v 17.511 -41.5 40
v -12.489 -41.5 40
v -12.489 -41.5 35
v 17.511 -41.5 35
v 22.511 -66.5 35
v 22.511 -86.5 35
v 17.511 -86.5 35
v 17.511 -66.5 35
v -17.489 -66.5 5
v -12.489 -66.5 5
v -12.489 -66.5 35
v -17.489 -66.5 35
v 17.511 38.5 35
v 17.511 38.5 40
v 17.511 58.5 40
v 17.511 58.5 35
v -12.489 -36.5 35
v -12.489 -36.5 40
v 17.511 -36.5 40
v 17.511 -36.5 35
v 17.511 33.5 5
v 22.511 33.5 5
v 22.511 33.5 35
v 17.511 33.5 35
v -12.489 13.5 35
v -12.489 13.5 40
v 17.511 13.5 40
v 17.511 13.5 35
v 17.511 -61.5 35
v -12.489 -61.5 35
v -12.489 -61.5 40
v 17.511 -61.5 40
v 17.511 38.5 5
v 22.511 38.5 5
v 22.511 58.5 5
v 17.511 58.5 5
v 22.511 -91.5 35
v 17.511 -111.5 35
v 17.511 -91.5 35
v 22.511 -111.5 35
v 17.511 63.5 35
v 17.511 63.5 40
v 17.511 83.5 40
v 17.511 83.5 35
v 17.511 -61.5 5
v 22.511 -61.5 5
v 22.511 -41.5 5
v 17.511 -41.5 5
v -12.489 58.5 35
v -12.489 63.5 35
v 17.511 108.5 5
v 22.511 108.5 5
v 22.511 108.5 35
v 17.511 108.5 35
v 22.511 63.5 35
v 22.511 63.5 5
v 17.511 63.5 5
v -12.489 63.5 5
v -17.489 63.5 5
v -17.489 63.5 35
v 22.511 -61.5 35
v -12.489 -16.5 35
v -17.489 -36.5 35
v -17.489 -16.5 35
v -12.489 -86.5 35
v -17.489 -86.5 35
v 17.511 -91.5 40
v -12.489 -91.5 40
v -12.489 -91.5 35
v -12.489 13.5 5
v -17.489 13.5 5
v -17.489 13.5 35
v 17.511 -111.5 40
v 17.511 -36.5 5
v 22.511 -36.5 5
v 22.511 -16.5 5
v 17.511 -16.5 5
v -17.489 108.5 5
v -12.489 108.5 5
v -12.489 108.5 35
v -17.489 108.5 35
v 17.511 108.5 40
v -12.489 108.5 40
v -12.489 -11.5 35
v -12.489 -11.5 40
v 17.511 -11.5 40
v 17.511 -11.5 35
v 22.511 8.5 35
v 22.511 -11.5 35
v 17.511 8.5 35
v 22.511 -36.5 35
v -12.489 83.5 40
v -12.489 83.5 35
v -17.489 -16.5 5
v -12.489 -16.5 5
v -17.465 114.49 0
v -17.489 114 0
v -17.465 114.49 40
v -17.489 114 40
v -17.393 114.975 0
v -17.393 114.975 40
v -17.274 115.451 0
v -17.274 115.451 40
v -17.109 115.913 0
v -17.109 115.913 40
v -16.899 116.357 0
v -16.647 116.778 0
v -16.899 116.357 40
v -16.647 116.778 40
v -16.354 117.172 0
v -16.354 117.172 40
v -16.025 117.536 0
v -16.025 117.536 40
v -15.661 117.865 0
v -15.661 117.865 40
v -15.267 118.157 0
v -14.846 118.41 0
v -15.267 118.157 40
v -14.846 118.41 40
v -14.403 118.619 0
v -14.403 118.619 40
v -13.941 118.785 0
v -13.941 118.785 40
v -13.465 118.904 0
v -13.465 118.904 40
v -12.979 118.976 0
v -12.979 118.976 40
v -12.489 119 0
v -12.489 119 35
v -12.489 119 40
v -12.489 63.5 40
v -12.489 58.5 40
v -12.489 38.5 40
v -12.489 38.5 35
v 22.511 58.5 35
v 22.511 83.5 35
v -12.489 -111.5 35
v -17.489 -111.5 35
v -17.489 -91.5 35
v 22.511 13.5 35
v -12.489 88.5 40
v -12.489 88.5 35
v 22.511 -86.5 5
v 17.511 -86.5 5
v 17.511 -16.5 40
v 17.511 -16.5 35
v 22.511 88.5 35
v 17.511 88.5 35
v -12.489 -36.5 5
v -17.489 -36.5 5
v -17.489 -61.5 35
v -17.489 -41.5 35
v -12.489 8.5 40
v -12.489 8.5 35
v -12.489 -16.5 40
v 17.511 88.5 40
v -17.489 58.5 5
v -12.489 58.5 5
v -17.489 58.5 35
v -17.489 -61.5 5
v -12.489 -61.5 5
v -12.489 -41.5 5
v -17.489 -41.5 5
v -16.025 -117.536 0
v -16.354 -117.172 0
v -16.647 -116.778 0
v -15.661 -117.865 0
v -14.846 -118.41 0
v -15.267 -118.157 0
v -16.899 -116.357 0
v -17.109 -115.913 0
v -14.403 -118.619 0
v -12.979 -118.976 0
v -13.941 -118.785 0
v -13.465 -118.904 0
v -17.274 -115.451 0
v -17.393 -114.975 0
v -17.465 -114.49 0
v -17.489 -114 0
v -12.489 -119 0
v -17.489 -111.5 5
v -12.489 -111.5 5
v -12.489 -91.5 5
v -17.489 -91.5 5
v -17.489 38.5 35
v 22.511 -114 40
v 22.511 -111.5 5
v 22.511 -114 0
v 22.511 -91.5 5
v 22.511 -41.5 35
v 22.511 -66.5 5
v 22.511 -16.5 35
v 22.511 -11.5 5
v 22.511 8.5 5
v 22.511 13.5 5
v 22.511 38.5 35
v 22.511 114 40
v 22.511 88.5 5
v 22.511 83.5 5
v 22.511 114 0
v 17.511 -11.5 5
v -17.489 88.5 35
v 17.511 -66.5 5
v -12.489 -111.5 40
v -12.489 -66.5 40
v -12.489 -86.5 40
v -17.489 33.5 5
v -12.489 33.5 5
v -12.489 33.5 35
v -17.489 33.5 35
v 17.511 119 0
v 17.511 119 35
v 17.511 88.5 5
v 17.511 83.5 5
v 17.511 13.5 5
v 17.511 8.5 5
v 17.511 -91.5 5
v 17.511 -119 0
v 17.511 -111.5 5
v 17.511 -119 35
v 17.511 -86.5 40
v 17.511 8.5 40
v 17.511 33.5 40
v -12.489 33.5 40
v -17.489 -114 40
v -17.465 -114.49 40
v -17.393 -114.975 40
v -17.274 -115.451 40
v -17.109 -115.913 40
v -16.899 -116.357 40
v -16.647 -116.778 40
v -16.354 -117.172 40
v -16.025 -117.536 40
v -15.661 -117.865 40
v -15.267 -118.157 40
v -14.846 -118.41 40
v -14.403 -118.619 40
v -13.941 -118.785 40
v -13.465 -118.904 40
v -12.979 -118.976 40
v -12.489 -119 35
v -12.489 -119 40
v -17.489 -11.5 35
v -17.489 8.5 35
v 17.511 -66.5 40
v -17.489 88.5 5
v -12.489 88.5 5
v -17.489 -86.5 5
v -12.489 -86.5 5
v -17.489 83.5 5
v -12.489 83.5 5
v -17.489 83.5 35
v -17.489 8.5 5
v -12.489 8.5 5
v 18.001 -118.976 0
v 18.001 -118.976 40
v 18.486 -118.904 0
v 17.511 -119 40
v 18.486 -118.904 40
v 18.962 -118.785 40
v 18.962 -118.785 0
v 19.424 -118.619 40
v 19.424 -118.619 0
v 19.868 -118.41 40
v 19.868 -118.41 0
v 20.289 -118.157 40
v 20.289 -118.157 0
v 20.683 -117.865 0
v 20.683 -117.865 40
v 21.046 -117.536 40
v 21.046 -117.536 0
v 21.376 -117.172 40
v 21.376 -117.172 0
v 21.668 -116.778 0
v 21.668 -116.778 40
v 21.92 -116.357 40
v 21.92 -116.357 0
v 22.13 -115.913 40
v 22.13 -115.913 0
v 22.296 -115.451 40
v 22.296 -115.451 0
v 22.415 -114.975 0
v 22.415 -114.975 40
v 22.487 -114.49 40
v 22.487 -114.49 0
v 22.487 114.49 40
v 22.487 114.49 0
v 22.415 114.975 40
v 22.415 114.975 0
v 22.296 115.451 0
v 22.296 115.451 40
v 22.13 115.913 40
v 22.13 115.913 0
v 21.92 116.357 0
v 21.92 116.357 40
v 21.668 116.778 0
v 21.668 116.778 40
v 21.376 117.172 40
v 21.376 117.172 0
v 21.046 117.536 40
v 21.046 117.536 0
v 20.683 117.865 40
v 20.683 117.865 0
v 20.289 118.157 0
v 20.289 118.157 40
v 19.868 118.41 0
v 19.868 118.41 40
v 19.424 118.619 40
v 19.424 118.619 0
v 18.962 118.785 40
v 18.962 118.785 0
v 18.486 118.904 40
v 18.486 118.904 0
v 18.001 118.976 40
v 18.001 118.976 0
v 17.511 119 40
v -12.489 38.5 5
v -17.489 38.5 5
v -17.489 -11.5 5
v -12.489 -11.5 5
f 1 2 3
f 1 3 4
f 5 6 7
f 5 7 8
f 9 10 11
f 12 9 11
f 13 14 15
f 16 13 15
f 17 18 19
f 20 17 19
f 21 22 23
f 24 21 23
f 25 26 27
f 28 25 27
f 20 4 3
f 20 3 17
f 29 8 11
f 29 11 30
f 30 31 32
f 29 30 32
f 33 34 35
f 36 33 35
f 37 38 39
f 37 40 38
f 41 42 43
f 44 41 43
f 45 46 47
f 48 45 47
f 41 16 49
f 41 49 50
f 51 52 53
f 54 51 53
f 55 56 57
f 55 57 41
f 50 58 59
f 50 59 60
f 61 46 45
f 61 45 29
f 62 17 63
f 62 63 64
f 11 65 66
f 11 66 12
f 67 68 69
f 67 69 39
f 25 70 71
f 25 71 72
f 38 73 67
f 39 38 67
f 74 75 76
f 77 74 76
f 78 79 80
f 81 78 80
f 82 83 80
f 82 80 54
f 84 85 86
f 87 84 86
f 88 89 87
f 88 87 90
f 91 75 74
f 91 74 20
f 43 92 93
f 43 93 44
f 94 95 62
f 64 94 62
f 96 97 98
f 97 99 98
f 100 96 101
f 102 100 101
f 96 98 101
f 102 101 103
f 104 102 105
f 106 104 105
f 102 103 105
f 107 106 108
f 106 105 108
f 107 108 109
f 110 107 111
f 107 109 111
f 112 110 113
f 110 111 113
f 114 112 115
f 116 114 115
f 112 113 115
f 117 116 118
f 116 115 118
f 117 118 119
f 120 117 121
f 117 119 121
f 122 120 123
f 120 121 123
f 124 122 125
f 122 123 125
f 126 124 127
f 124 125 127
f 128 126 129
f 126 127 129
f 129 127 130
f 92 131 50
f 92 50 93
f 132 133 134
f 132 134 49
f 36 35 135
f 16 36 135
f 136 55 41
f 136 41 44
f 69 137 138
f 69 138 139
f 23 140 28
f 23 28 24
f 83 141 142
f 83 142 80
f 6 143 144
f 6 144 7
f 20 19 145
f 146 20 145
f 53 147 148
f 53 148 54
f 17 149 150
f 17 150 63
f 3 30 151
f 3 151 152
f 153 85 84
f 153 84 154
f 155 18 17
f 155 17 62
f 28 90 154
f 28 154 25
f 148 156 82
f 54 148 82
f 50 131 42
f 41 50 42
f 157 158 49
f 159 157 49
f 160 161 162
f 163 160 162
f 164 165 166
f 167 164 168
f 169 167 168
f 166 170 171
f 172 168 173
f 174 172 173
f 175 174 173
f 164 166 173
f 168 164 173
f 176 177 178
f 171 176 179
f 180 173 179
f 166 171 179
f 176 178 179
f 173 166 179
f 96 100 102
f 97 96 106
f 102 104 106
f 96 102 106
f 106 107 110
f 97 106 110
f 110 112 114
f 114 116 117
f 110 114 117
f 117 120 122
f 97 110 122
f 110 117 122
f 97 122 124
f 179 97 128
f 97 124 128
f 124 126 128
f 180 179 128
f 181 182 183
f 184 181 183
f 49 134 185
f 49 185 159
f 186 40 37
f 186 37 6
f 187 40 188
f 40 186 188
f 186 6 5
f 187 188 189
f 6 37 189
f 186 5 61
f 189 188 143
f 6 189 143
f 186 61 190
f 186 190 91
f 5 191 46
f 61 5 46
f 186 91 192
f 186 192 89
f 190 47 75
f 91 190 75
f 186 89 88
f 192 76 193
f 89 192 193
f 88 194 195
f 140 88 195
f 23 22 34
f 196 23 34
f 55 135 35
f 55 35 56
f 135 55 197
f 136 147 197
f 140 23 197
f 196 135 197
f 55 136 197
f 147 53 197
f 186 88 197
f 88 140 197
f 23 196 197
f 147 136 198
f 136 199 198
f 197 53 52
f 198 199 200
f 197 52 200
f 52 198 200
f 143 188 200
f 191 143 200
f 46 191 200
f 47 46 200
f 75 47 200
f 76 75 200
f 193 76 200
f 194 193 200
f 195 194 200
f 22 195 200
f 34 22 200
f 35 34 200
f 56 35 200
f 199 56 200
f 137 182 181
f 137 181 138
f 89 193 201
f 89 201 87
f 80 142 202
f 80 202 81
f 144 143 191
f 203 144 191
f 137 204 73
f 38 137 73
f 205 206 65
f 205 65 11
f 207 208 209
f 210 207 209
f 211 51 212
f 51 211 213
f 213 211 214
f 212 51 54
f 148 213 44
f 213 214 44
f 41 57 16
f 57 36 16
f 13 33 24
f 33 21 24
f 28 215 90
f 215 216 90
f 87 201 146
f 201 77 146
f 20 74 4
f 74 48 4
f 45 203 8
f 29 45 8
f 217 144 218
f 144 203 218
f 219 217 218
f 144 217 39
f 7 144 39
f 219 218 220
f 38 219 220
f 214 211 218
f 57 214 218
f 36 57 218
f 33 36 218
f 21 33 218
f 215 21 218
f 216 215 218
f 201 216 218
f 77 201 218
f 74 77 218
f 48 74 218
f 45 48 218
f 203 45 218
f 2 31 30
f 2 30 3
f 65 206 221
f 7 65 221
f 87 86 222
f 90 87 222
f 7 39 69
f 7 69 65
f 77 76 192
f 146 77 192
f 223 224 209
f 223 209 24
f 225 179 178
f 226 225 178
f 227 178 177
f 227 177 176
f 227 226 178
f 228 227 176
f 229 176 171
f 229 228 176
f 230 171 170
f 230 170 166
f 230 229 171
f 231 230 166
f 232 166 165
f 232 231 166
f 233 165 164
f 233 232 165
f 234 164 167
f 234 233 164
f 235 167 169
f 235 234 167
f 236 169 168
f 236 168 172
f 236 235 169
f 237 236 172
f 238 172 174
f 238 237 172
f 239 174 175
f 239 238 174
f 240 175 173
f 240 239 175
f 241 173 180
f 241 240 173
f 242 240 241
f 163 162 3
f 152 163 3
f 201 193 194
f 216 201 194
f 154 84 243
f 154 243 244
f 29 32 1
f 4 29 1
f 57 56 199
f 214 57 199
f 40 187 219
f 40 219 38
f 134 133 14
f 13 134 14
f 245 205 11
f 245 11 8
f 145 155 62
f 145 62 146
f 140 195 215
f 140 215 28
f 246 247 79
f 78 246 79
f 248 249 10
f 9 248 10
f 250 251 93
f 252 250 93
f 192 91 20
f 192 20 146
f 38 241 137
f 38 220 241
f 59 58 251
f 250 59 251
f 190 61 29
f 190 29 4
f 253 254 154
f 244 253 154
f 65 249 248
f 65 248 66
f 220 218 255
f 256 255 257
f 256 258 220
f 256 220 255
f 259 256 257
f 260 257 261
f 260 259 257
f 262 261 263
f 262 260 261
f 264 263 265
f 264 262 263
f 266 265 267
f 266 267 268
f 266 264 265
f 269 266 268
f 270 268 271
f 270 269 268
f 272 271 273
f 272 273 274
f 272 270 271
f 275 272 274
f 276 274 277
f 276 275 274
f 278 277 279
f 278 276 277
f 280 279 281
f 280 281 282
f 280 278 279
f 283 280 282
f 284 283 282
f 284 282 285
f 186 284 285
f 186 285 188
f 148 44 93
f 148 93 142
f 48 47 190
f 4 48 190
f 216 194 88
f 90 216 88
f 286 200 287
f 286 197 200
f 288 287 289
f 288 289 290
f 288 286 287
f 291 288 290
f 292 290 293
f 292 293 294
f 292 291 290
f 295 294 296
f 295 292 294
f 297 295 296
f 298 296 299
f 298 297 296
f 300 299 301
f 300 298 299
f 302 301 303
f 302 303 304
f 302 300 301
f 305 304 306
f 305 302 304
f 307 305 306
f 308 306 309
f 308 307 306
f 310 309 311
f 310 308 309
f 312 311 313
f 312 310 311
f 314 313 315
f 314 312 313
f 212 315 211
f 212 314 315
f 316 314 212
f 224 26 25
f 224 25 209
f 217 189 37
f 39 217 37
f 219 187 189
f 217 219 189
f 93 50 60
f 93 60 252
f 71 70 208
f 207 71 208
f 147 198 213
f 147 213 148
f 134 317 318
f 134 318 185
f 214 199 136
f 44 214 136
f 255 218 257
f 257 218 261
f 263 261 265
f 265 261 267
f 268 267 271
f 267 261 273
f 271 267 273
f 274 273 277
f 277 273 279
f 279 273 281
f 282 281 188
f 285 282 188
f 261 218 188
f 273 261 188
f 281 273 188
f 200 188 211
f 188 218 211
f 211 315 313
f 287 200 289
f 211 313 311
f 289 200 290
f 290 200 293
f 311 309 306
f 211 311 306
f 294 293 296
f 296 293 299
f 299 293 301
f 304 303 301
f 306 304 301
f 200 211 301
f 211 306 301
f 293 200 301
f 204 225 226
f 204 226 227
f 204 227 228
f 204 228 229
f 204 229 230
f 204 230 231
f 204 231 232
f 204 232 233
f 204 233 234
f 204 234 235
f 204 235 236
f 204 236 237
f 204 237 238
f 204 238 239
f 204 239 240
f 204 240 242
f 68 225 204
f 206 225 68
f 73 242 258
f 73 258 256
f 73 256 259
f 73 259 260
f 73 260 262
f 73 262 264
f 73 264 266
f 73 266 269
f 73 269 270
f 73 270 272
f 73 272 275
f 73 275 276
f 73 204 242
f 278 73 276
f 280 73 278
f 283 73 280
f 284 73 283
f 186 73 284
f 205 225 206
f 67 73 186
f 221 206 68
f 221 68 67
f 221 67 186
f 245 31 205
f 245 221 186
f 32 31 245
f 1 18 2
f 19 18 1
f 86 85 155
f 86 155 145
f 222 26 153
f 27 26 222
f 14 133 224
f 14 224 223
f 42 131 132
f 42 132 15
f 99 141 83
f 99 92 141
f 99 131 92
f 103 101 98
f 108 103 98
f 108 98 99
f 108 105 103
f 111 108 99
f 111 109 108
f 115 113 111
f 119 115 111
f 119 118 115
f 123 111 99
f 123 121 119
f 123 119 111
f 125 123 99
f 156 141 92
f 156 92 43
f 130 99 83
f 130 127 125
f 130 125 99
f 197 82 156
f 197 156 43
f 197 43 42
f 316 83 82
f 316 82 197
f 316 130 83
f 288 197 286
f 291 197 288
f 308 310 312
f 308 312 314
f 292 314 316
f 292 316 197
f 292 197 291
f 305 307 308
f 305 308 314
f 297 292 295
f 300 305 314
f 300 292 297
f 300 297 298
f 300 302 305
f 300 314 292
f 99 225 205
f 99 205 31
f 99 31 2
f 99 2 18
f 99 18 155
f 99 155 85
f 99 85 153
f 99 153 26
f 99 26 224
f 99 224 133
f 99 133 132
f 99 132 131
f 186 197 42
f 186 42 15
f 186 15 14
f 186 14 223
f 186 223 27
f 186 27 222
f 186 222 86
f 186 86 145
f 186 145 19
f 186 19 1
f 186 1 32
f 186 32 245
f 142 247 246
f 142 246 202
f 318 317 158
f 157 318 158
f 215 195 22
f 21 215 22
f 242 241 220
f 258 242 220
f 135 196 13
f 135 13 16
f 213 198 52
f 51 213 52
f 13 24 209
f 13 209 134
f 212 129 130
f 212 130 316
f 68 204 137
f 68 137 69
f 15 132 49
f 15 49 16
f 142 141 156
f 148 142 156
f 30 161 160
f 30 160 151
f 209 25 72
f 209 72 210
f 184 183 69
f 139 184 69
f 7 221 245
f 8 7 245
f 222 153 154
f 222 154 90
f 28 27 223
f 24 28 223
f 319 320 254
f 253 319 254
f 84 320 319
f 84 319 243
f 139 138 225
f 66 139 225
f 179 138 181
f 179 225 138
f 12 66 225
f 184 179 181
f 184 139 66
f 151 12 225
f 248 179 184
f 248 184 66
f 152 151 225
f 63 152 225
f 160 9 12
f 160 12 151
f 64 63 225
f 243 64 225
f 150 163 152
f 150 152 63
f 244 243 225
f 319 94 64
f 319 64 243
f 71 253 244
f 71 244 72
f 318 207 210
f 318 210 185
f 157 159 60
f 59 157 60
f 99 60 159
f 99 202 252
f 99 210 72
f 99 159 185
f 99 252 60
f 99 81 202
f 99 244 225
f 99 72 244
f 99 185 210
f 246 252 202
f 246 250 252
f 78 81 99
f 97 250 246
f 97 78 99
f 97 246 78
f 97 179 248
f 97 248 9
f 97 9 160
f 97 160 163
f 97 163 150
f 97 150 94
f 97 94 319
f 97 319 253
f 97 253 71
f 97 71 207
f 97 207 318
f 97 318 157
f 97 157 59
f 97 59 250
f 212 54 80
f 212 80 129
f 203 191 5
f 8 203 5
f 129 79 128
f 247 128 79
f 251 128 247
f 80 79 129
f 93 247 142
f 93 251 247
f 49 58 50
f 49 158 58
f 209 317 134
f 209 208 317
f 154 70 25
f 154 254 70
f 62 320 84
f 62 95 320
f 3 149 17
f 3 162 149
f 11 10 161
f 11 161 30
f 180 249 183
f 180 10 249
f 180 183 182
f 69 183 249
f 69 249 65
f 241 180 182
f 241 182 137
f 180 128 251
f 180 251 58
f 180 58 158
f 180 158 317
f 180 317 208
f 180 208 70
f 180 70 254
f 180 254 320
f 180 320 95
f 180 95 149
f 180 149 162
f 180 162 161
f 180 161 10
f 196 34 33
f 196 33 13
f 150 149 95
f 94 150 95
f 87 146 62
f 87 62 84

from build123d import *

# Parameters (mm, degrees)
F0_W     = 40
F0_H     = 238
F1_DEPTH = 40
F2_R     = 5
F3_W     = 30
F3_H     = 35
F4_DEPTH = 238.001
F5_W     = 20
F5_H     = 30
F6_DEPTH = 40.001
F7_W     = 30
F7_H     = 20
F8_DEPTH = 40.001


with BuildPart() as f1:
    # F0 (on Top) → F1 (new body)
    with BuildSketch(Plane.XY):
        with Locations((2.510834, 0)):
            Rectangle(F0_W, F0_H)
    extrude(amount=F1_DEPTH)

    # F2
    f2_edges = [f1.edges().sort_by_distance(p)[0] for p in [
        (22.510834, -119, 20),
        (-17.489166, -119, 20),
        (22.510834, 119, 20),
        (-17.489166, 119, 20),
    ]]
    fillet(f2_edges, radius=F2_R)

    # F3 (on face) → F4 (cut, through all)
    with BuildSketch(Plane.XZ.offset(119)):
        with Locations((2.510834, 17.5)):
            Rectangle(F3_W, F3_H)
    extrude(amount=-F4_DEPTH, mode=Mode.SUBTRACT)

    # F5 (on face) → F6 (cut, through all)
    with BuildSketch(Plane.YZ.offset(22.510834)):
        with Locations((-101.5, 20)):
            Rectangle(F5_W, F5_H)
        with Locations((-76.5, 20)):
            Rectangle(F5_W, F5_H)
        with Locations((-51.5, 20)):
            Rectangle(F5_W, F5_H)
        with Locations((-26.5, 20)):
            Rectangle(F5_W, F5_H)
        with Locations((-1.5, 20)):
            Rectangle(F5_W, F5_H)
        with Locations((23.5, 20)):
            Rectangle(F5_W, F5_H)
        with Locations((48.5, 20)):
            Rectangle(F5_W, F5_H)
        with Locations((73.5, 20)):
            Rectangle(F5_W, F5_H)
        with Locations((98.5, 20)):
            Rectangle(F5_W, F5_H)
    extrude(amount=-F6_DEPTH, mode=Mode.SUBTRACT)

    # F7 (on face) → F8 (cut, through all)
    with BuildSketch(Plane.XY.offset(40)):
        with Locations((2.510834, -101.5)):
            Rectangle(F7_W, F7_H)
        with Locations((2.510834, -76.5)):
            Rectangle(F7_W, F7_H)
        with Locations((2.510834, -51.5)):
            Rectangle(F7_W, F7_H)
        with Locations((2.510834, -26.5)):
            Rectangle(F7_W, F7_H)
        with Locations((2.510834, -1.5)):
            Rectangle(F7_W, F7_H)
        with Locations((2.510834, 23.5)):
            Rectangle(F7_W, F7_H)
        with Locations((2.510834, 48.5)):
            Rectangle(F7_W, F7_H)
        with Locations((2.510834, 73.5)):
            Rectangle(F7_W, F7_H)
        with Locations((2.510834, 98.5)):
            Rectangle(F7_W, F7_H)
    extrude(amount=-F8_DEPTH, mode=Mode.SUBTRACT)


solid = f1.part
